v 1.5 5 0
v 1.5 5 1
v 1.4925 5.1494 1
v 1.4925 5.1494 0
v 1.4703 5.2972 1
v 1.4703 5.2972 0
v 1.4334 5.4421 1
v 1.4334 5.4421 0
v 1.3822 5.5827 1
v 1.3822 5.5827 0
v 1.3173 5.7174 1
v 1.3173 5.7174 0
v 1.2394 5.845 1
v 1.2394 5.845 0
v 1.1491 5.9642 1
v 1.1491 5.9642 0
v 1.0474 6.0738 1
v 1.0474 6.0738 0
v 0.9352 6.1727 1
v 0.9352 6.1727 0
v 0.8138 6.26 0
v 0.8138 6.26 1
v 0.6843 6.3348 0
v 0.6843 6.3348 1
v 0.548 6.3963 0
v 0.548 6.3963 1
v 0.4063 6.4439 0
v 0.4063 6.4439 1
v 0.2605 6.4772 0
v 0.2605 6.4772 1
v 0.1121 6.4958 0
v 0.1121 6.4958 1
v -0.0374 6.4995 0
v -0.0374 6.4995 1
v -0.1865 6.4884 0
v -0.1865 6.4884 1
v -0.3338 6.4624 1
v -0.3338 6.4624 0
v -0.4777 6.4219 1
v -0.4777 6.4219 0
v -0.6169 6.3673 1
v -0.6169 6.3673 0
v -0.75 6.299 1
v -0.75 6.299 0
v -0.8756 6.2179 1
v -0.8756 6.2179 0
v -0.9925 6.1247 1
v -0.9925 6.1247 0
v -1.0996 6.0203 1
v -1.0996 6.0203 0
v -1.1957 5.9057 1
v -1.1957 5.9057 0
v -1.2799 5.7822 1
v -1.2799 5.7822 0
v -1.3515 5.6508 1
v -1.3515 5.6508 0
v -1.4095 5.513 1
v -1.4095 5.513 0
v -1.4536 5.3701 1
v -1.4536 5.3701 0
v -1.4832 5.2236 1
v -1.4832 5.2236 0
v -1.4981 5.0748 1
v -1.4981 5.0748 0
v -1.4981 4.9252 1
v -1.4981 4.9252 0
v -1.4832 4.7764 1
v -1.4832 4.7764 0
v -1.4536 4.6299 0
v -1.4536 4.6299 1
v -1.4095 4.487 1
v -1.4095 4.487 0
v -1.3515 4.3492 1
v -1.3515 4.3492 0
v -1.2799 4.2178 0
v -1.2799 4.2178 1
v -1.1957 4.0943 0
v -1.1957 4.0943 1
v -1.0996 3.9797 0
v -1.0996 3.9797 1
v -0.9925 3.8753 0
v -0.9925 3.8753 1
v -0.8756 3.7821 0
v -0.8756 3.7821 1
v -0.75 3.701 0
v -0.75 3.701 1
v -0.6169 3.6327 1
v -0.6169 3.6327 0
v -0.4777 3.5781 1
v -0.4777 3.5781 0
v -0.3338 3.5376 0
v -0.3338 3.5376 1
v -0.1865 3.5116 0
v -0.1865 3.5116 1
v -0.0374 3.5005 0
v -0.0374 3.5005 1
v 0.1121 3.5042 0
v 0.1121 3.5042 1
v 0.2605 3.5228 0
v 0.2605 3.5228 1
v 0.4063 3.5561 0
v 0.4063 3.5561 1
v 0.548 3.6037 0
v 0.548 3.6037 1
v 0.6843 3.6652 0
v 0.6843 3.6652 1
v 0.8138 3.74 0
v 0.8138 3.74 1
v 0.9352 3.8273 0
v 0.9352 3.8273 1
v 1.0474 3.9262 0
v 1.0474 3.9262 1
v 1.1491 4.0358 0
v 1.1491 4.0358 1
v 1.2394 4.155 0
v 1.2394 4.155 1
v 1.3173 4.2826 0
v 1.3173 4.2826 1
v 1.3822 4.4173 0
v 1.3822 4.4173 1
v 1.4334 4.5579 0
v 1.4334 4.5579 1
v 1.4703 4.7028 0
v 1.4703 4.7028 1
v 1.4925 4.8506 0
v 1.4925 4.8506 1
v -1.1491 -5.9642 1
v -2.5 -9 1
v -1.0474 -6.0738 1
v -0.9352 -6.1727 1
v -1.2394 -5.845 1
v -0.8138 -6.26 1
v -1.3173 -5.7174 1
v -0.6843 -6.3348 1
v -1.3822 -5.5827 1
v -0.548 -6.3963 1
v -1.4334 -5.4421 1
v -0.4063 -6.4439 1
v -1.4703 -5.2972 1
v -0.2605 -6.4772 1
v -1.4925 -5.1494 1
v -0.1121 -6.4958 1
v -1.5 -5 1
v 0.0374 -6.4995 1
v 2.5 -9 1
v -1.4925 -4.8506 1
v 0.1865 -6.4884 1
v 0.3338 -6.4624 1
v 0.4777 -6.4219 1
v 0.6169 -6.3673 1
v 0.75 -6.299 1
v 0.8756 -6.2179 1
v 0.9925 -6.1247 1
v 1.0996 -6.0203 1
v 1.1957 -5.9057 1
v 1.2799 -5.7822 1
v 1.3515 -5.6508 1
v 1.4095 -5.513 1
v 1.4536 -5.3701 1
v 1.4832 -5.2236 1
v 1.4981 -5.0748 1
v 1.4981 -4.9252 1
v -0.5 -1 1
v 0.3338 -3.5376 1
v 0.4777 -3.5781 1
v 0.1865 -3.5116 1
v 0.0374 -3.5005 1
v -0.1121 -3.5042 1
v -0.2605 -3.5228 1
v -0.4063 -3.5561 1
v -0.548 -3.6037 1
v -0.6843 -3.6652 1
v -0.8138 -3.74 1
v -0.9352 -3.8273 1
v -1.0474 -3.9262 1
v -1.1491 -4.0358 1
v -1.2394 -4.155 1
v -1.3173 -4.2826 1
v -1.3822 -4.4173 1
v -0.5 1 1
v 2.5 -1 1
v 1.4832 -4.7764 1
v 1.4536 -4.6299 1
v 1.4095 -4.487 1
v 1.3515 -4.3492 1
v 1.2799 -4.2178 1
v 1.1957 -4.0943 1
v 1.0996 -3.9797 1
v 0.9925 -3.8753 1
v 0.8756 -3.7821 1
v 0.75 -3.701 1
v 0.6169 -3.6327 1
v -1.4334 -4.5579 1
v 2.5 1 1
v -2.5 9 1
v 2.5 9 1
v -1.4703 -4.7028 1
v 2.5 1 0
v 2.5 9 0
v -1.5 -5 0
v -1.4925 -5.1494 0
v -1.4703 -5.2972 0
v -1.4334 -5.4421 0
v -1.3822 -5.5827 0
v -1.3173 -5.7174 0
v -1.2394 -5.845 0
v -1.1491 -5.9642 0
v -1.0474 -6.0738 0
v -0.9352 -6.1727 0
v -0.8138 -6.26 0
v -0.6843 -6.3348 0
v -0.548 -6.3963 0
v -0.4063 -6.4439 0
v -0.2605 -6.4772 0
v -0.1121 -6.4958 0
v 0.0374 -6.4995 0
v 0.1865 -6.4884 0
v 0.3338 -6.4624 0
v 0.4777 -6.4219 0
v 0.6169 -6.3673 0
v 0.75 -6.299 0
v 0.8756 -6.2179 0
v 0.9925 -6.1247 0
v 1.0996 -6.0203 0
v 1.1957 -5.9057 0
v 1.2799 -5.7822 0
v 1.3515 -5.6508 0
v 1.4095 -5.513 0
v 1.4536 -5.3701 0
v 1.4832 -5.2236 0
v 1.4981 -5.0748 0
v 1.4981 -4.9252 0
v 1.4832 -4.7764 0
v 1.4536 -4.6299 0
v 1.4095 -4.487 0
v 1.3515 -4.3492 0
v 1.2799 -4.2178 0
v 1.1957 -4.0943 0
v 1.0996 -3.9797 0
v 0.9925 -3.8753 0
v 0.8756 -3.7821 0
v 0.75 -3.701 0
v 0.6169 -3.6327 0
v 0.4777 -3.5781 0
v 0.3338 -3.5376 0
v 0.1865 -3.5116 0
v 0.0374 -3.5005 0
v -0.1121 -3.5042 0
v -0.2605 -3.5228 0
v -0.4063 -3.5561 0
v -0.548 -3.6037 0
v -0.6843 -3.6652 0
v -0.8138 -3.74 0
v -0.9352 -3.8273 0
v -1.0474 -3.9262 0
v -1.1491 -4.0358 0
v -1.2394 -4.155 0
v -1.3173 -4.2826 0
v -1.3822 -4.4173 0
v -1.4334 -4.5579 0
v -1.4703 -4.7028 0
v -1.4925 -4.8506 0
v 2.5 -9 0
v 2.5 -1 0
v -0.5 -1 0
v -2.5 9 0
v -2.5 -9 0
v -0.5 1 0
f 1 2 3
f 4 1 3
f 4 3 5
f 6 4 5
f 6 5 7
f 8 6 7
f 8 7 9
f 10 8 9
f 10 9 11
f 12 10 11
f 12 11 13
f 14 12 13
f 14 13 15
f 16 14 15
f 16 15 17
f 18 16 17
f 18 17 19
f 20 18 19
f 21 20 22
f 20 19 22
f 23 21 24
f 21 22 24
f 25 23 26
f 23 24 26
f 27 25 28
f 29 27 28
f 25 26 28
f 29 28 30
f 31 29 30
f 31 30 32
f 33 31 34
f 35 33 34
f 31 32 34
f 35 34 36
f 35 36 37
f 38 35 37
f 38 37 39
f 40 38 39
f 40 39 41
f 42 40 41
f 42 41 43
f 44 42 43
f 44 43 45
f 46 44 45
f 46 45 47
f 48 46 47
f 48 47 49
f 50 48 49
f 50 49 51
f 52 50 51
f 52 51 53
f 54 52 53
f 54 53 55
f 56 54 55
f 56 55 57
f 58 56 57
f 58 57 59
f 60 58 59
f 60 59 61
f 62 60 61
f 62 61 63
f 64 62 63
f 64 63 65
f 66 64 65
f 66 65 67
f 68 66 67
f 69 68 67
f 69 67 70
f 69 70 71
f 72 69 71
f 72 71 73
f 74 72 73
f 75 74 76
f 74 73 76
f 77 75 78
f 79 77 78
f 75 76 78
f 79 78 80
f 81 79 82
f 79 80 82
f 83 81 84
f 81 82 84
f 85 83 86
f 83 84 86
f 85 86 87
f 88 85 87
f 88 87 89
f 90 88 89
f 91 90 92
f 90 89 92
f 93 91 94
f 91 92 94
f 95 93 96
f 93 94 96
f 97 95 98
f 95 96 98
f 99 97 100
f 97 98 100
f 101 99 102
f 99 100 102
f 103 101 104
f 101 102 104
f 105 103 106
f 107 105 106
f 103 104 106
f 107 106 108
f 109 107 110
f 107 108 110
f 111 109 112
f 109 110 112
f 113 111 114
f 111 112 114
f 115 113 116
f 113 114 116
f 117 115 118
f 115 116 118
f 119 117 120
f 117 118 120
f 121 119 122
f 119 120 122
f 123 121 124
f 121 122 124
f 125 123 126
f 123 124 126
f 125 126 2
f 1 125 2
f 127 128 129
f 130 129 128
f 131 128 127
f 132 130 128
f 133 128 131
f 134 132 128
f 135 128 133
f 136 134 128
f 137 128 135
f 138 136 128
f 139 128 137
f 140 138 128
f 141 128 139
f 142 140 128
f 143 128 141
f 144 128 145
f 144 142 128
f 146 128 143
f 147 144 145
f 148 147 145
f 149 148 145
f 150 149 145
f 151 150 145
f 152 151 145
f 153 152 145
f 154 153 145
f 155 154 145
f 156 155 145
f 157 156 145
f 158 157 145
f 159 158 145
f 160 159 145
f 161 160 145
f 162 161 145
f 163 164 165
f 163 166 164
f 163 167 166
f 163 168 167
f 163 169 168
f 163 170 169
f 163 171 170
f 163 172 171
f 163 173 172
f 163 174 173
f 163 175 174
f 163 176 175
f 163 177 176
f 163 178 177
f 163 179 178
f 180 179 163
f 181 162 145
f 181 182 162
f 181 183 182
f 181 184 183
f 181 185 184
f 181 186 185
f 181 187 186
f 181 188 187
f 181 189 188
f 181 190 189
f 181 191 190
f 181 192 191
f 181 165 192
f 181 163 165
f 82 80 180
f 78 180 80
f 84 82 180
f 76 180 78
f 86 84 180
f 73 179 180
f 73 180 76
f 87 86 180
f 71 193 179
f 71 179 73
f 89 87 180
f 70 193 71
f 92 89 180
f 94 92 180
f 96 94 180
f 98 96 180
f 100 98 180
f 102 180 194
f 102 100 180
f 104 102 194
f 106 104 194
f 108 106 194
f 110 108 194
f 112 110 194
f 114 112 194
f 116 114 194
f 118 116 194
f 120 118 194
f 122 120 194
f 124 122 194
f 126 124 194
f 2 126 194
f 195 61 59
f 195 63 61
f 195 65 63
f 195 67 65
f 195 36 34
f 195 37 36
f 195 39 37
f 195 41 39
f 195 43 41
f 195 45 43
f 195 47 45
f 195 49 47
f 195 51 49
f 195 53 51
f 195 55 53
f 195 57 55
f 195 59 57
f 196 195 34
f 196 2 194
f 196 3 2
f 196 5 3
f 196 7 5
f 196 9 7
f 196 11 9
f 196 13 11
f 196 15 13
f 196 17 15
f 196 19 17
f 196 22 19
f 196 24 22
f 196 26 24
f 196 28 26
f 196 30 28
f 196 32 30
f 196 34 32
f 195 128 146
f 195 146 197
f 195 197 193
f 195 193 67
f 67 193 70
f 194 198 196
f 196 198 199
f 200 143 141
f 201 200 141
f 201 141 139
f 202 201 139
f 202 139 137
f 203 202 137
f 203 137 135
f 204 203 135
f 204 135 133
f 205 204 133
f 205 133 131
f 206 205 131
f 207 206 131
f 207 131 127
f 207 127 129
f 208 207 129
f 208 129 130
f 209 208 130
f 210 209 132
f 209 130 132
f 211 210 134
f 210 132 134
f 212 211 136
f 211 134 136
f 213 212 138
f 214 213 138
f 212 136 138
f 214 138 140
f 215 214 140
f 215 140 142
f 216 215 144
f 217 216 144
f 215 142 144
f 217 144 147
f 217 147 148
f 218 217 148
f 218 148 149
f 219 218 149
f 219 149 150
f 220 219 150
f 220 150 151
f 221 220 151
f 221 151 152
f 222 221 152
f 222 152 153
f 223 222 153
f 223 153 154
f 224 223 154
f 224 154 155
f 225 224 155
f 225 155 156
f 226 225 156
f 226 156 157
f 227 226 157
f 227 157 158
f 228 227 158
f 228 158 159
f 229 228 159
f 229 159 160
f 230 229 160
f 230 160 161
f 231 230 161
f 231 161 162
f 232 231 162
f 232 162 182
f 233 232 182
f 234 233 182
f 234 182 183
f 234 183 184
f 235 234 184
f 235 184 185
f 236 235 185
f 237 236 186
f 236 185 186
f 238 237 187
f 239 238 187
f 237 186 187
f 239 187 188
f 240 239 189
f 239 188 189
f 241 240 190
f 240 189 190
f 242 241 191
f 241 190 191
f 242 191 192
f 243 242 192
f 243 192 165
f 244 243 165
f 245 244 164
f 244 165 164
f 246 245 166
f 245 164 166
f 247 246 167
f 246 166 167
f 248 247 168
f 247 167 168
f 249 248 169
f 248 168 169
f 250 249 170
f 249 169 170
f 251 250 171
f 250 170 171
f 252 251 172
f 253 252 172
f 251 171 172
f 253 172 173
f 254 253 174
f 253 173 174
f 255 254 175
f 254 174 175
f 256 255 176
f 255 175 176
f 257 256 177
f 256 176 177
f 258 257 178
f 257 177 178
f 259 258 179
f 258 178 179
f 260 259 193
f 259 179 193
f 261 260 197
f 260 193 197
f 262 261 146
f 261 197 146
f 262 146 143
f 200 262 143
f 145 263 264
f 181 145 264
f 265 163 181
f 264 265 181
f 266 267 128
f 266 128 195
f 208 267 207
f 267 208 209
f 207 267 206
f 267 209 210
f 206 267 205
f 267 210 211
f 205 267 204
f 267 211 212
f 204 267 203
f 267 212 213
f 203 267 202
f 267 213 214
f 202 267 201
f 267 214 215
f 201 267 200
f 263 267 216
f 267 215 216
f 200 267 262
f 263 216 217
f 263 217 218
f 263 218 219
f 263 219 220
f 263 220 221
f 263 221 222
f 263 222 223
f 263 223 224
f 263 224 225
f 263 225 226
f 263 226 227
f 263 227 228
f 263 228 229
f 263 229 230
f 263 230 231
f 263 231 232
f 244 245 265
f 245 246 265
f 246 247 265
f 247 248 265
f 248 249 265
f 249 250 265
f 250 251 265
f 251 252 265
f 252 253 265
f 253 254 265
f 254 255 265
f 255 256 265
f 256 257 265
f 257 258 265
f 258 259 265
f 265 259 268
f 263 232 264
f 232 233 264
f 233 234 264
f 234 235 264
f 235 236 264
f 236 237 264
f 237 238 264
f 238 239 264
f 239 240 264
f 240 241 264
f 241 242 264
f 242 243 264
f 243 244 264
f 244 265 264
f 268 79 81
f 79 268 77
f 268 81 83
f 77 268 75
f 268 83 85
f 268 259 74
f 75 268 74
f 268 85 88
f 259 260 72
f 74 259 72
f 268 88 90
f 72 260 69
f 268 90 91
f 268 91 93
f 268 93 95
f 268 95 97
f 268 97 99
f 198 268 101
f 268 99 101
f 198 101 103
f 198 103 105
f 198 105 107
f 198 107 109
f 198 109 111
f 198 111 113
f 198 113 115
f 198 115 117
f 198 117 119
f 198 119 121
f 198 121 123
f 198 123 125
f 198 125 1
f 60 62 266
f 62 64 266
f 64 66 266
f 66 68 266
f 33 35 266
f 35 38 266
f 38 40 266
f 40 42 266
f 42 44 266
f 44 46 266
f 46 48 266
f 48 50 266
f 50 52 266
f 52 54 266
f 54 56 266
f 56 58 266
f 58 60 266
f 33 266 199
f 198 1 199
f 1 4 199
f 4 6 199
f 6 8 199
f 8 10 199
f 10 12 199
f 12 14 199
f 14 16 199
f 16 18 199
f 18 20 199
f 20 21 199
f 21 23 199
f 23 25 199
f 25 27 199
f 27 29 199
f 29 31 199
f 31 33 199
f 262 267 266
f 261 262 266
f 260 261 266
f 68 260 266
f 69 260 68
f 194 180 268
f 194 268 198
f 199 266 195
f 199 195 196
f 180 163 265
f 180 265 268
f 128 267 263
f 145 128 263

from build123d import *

# Parameters (mm, degrees)
SKETCH1_W           = 5
SKETCH1_H           = 18
BOSS_EXTRUDE1_DEPTH = 1
SKETCH2_R           = 1.5
SKETCH2_W           = 3
SKETCH2_H           = 2
CUT_EXTRUDE1_DEPTH  = 10.394147114


with BuildPart() as part:
    # Sketch1 → Boss-Extrude1 (new body)
    with BuildSketch(Plane.XY):
        Rectangle(SKETCH1_W, SKETCH1_H)
    extrude(amount=BOSS_EXTRUDE1_DEPTH)

    # Sketch2 → Cut-Extrude1 (cut, through all)
    with BuildSketch(Plane.XY.offset(1)):
        with Locations((0, 5)):
            Circle(SKETCH2_R)
        with Locations(Location((0, -5, 0), (0, 0, 180))):
            Circle(SKETCH2_R)
        with Locations((1, 0)):
            Rectangle(SKETCH2_W, SKETCH2_H)
    extrude(amount=-CUT_EXTRUDE1_DEPTH, mode=Mode.SUBTRACT)


solid = part.part
